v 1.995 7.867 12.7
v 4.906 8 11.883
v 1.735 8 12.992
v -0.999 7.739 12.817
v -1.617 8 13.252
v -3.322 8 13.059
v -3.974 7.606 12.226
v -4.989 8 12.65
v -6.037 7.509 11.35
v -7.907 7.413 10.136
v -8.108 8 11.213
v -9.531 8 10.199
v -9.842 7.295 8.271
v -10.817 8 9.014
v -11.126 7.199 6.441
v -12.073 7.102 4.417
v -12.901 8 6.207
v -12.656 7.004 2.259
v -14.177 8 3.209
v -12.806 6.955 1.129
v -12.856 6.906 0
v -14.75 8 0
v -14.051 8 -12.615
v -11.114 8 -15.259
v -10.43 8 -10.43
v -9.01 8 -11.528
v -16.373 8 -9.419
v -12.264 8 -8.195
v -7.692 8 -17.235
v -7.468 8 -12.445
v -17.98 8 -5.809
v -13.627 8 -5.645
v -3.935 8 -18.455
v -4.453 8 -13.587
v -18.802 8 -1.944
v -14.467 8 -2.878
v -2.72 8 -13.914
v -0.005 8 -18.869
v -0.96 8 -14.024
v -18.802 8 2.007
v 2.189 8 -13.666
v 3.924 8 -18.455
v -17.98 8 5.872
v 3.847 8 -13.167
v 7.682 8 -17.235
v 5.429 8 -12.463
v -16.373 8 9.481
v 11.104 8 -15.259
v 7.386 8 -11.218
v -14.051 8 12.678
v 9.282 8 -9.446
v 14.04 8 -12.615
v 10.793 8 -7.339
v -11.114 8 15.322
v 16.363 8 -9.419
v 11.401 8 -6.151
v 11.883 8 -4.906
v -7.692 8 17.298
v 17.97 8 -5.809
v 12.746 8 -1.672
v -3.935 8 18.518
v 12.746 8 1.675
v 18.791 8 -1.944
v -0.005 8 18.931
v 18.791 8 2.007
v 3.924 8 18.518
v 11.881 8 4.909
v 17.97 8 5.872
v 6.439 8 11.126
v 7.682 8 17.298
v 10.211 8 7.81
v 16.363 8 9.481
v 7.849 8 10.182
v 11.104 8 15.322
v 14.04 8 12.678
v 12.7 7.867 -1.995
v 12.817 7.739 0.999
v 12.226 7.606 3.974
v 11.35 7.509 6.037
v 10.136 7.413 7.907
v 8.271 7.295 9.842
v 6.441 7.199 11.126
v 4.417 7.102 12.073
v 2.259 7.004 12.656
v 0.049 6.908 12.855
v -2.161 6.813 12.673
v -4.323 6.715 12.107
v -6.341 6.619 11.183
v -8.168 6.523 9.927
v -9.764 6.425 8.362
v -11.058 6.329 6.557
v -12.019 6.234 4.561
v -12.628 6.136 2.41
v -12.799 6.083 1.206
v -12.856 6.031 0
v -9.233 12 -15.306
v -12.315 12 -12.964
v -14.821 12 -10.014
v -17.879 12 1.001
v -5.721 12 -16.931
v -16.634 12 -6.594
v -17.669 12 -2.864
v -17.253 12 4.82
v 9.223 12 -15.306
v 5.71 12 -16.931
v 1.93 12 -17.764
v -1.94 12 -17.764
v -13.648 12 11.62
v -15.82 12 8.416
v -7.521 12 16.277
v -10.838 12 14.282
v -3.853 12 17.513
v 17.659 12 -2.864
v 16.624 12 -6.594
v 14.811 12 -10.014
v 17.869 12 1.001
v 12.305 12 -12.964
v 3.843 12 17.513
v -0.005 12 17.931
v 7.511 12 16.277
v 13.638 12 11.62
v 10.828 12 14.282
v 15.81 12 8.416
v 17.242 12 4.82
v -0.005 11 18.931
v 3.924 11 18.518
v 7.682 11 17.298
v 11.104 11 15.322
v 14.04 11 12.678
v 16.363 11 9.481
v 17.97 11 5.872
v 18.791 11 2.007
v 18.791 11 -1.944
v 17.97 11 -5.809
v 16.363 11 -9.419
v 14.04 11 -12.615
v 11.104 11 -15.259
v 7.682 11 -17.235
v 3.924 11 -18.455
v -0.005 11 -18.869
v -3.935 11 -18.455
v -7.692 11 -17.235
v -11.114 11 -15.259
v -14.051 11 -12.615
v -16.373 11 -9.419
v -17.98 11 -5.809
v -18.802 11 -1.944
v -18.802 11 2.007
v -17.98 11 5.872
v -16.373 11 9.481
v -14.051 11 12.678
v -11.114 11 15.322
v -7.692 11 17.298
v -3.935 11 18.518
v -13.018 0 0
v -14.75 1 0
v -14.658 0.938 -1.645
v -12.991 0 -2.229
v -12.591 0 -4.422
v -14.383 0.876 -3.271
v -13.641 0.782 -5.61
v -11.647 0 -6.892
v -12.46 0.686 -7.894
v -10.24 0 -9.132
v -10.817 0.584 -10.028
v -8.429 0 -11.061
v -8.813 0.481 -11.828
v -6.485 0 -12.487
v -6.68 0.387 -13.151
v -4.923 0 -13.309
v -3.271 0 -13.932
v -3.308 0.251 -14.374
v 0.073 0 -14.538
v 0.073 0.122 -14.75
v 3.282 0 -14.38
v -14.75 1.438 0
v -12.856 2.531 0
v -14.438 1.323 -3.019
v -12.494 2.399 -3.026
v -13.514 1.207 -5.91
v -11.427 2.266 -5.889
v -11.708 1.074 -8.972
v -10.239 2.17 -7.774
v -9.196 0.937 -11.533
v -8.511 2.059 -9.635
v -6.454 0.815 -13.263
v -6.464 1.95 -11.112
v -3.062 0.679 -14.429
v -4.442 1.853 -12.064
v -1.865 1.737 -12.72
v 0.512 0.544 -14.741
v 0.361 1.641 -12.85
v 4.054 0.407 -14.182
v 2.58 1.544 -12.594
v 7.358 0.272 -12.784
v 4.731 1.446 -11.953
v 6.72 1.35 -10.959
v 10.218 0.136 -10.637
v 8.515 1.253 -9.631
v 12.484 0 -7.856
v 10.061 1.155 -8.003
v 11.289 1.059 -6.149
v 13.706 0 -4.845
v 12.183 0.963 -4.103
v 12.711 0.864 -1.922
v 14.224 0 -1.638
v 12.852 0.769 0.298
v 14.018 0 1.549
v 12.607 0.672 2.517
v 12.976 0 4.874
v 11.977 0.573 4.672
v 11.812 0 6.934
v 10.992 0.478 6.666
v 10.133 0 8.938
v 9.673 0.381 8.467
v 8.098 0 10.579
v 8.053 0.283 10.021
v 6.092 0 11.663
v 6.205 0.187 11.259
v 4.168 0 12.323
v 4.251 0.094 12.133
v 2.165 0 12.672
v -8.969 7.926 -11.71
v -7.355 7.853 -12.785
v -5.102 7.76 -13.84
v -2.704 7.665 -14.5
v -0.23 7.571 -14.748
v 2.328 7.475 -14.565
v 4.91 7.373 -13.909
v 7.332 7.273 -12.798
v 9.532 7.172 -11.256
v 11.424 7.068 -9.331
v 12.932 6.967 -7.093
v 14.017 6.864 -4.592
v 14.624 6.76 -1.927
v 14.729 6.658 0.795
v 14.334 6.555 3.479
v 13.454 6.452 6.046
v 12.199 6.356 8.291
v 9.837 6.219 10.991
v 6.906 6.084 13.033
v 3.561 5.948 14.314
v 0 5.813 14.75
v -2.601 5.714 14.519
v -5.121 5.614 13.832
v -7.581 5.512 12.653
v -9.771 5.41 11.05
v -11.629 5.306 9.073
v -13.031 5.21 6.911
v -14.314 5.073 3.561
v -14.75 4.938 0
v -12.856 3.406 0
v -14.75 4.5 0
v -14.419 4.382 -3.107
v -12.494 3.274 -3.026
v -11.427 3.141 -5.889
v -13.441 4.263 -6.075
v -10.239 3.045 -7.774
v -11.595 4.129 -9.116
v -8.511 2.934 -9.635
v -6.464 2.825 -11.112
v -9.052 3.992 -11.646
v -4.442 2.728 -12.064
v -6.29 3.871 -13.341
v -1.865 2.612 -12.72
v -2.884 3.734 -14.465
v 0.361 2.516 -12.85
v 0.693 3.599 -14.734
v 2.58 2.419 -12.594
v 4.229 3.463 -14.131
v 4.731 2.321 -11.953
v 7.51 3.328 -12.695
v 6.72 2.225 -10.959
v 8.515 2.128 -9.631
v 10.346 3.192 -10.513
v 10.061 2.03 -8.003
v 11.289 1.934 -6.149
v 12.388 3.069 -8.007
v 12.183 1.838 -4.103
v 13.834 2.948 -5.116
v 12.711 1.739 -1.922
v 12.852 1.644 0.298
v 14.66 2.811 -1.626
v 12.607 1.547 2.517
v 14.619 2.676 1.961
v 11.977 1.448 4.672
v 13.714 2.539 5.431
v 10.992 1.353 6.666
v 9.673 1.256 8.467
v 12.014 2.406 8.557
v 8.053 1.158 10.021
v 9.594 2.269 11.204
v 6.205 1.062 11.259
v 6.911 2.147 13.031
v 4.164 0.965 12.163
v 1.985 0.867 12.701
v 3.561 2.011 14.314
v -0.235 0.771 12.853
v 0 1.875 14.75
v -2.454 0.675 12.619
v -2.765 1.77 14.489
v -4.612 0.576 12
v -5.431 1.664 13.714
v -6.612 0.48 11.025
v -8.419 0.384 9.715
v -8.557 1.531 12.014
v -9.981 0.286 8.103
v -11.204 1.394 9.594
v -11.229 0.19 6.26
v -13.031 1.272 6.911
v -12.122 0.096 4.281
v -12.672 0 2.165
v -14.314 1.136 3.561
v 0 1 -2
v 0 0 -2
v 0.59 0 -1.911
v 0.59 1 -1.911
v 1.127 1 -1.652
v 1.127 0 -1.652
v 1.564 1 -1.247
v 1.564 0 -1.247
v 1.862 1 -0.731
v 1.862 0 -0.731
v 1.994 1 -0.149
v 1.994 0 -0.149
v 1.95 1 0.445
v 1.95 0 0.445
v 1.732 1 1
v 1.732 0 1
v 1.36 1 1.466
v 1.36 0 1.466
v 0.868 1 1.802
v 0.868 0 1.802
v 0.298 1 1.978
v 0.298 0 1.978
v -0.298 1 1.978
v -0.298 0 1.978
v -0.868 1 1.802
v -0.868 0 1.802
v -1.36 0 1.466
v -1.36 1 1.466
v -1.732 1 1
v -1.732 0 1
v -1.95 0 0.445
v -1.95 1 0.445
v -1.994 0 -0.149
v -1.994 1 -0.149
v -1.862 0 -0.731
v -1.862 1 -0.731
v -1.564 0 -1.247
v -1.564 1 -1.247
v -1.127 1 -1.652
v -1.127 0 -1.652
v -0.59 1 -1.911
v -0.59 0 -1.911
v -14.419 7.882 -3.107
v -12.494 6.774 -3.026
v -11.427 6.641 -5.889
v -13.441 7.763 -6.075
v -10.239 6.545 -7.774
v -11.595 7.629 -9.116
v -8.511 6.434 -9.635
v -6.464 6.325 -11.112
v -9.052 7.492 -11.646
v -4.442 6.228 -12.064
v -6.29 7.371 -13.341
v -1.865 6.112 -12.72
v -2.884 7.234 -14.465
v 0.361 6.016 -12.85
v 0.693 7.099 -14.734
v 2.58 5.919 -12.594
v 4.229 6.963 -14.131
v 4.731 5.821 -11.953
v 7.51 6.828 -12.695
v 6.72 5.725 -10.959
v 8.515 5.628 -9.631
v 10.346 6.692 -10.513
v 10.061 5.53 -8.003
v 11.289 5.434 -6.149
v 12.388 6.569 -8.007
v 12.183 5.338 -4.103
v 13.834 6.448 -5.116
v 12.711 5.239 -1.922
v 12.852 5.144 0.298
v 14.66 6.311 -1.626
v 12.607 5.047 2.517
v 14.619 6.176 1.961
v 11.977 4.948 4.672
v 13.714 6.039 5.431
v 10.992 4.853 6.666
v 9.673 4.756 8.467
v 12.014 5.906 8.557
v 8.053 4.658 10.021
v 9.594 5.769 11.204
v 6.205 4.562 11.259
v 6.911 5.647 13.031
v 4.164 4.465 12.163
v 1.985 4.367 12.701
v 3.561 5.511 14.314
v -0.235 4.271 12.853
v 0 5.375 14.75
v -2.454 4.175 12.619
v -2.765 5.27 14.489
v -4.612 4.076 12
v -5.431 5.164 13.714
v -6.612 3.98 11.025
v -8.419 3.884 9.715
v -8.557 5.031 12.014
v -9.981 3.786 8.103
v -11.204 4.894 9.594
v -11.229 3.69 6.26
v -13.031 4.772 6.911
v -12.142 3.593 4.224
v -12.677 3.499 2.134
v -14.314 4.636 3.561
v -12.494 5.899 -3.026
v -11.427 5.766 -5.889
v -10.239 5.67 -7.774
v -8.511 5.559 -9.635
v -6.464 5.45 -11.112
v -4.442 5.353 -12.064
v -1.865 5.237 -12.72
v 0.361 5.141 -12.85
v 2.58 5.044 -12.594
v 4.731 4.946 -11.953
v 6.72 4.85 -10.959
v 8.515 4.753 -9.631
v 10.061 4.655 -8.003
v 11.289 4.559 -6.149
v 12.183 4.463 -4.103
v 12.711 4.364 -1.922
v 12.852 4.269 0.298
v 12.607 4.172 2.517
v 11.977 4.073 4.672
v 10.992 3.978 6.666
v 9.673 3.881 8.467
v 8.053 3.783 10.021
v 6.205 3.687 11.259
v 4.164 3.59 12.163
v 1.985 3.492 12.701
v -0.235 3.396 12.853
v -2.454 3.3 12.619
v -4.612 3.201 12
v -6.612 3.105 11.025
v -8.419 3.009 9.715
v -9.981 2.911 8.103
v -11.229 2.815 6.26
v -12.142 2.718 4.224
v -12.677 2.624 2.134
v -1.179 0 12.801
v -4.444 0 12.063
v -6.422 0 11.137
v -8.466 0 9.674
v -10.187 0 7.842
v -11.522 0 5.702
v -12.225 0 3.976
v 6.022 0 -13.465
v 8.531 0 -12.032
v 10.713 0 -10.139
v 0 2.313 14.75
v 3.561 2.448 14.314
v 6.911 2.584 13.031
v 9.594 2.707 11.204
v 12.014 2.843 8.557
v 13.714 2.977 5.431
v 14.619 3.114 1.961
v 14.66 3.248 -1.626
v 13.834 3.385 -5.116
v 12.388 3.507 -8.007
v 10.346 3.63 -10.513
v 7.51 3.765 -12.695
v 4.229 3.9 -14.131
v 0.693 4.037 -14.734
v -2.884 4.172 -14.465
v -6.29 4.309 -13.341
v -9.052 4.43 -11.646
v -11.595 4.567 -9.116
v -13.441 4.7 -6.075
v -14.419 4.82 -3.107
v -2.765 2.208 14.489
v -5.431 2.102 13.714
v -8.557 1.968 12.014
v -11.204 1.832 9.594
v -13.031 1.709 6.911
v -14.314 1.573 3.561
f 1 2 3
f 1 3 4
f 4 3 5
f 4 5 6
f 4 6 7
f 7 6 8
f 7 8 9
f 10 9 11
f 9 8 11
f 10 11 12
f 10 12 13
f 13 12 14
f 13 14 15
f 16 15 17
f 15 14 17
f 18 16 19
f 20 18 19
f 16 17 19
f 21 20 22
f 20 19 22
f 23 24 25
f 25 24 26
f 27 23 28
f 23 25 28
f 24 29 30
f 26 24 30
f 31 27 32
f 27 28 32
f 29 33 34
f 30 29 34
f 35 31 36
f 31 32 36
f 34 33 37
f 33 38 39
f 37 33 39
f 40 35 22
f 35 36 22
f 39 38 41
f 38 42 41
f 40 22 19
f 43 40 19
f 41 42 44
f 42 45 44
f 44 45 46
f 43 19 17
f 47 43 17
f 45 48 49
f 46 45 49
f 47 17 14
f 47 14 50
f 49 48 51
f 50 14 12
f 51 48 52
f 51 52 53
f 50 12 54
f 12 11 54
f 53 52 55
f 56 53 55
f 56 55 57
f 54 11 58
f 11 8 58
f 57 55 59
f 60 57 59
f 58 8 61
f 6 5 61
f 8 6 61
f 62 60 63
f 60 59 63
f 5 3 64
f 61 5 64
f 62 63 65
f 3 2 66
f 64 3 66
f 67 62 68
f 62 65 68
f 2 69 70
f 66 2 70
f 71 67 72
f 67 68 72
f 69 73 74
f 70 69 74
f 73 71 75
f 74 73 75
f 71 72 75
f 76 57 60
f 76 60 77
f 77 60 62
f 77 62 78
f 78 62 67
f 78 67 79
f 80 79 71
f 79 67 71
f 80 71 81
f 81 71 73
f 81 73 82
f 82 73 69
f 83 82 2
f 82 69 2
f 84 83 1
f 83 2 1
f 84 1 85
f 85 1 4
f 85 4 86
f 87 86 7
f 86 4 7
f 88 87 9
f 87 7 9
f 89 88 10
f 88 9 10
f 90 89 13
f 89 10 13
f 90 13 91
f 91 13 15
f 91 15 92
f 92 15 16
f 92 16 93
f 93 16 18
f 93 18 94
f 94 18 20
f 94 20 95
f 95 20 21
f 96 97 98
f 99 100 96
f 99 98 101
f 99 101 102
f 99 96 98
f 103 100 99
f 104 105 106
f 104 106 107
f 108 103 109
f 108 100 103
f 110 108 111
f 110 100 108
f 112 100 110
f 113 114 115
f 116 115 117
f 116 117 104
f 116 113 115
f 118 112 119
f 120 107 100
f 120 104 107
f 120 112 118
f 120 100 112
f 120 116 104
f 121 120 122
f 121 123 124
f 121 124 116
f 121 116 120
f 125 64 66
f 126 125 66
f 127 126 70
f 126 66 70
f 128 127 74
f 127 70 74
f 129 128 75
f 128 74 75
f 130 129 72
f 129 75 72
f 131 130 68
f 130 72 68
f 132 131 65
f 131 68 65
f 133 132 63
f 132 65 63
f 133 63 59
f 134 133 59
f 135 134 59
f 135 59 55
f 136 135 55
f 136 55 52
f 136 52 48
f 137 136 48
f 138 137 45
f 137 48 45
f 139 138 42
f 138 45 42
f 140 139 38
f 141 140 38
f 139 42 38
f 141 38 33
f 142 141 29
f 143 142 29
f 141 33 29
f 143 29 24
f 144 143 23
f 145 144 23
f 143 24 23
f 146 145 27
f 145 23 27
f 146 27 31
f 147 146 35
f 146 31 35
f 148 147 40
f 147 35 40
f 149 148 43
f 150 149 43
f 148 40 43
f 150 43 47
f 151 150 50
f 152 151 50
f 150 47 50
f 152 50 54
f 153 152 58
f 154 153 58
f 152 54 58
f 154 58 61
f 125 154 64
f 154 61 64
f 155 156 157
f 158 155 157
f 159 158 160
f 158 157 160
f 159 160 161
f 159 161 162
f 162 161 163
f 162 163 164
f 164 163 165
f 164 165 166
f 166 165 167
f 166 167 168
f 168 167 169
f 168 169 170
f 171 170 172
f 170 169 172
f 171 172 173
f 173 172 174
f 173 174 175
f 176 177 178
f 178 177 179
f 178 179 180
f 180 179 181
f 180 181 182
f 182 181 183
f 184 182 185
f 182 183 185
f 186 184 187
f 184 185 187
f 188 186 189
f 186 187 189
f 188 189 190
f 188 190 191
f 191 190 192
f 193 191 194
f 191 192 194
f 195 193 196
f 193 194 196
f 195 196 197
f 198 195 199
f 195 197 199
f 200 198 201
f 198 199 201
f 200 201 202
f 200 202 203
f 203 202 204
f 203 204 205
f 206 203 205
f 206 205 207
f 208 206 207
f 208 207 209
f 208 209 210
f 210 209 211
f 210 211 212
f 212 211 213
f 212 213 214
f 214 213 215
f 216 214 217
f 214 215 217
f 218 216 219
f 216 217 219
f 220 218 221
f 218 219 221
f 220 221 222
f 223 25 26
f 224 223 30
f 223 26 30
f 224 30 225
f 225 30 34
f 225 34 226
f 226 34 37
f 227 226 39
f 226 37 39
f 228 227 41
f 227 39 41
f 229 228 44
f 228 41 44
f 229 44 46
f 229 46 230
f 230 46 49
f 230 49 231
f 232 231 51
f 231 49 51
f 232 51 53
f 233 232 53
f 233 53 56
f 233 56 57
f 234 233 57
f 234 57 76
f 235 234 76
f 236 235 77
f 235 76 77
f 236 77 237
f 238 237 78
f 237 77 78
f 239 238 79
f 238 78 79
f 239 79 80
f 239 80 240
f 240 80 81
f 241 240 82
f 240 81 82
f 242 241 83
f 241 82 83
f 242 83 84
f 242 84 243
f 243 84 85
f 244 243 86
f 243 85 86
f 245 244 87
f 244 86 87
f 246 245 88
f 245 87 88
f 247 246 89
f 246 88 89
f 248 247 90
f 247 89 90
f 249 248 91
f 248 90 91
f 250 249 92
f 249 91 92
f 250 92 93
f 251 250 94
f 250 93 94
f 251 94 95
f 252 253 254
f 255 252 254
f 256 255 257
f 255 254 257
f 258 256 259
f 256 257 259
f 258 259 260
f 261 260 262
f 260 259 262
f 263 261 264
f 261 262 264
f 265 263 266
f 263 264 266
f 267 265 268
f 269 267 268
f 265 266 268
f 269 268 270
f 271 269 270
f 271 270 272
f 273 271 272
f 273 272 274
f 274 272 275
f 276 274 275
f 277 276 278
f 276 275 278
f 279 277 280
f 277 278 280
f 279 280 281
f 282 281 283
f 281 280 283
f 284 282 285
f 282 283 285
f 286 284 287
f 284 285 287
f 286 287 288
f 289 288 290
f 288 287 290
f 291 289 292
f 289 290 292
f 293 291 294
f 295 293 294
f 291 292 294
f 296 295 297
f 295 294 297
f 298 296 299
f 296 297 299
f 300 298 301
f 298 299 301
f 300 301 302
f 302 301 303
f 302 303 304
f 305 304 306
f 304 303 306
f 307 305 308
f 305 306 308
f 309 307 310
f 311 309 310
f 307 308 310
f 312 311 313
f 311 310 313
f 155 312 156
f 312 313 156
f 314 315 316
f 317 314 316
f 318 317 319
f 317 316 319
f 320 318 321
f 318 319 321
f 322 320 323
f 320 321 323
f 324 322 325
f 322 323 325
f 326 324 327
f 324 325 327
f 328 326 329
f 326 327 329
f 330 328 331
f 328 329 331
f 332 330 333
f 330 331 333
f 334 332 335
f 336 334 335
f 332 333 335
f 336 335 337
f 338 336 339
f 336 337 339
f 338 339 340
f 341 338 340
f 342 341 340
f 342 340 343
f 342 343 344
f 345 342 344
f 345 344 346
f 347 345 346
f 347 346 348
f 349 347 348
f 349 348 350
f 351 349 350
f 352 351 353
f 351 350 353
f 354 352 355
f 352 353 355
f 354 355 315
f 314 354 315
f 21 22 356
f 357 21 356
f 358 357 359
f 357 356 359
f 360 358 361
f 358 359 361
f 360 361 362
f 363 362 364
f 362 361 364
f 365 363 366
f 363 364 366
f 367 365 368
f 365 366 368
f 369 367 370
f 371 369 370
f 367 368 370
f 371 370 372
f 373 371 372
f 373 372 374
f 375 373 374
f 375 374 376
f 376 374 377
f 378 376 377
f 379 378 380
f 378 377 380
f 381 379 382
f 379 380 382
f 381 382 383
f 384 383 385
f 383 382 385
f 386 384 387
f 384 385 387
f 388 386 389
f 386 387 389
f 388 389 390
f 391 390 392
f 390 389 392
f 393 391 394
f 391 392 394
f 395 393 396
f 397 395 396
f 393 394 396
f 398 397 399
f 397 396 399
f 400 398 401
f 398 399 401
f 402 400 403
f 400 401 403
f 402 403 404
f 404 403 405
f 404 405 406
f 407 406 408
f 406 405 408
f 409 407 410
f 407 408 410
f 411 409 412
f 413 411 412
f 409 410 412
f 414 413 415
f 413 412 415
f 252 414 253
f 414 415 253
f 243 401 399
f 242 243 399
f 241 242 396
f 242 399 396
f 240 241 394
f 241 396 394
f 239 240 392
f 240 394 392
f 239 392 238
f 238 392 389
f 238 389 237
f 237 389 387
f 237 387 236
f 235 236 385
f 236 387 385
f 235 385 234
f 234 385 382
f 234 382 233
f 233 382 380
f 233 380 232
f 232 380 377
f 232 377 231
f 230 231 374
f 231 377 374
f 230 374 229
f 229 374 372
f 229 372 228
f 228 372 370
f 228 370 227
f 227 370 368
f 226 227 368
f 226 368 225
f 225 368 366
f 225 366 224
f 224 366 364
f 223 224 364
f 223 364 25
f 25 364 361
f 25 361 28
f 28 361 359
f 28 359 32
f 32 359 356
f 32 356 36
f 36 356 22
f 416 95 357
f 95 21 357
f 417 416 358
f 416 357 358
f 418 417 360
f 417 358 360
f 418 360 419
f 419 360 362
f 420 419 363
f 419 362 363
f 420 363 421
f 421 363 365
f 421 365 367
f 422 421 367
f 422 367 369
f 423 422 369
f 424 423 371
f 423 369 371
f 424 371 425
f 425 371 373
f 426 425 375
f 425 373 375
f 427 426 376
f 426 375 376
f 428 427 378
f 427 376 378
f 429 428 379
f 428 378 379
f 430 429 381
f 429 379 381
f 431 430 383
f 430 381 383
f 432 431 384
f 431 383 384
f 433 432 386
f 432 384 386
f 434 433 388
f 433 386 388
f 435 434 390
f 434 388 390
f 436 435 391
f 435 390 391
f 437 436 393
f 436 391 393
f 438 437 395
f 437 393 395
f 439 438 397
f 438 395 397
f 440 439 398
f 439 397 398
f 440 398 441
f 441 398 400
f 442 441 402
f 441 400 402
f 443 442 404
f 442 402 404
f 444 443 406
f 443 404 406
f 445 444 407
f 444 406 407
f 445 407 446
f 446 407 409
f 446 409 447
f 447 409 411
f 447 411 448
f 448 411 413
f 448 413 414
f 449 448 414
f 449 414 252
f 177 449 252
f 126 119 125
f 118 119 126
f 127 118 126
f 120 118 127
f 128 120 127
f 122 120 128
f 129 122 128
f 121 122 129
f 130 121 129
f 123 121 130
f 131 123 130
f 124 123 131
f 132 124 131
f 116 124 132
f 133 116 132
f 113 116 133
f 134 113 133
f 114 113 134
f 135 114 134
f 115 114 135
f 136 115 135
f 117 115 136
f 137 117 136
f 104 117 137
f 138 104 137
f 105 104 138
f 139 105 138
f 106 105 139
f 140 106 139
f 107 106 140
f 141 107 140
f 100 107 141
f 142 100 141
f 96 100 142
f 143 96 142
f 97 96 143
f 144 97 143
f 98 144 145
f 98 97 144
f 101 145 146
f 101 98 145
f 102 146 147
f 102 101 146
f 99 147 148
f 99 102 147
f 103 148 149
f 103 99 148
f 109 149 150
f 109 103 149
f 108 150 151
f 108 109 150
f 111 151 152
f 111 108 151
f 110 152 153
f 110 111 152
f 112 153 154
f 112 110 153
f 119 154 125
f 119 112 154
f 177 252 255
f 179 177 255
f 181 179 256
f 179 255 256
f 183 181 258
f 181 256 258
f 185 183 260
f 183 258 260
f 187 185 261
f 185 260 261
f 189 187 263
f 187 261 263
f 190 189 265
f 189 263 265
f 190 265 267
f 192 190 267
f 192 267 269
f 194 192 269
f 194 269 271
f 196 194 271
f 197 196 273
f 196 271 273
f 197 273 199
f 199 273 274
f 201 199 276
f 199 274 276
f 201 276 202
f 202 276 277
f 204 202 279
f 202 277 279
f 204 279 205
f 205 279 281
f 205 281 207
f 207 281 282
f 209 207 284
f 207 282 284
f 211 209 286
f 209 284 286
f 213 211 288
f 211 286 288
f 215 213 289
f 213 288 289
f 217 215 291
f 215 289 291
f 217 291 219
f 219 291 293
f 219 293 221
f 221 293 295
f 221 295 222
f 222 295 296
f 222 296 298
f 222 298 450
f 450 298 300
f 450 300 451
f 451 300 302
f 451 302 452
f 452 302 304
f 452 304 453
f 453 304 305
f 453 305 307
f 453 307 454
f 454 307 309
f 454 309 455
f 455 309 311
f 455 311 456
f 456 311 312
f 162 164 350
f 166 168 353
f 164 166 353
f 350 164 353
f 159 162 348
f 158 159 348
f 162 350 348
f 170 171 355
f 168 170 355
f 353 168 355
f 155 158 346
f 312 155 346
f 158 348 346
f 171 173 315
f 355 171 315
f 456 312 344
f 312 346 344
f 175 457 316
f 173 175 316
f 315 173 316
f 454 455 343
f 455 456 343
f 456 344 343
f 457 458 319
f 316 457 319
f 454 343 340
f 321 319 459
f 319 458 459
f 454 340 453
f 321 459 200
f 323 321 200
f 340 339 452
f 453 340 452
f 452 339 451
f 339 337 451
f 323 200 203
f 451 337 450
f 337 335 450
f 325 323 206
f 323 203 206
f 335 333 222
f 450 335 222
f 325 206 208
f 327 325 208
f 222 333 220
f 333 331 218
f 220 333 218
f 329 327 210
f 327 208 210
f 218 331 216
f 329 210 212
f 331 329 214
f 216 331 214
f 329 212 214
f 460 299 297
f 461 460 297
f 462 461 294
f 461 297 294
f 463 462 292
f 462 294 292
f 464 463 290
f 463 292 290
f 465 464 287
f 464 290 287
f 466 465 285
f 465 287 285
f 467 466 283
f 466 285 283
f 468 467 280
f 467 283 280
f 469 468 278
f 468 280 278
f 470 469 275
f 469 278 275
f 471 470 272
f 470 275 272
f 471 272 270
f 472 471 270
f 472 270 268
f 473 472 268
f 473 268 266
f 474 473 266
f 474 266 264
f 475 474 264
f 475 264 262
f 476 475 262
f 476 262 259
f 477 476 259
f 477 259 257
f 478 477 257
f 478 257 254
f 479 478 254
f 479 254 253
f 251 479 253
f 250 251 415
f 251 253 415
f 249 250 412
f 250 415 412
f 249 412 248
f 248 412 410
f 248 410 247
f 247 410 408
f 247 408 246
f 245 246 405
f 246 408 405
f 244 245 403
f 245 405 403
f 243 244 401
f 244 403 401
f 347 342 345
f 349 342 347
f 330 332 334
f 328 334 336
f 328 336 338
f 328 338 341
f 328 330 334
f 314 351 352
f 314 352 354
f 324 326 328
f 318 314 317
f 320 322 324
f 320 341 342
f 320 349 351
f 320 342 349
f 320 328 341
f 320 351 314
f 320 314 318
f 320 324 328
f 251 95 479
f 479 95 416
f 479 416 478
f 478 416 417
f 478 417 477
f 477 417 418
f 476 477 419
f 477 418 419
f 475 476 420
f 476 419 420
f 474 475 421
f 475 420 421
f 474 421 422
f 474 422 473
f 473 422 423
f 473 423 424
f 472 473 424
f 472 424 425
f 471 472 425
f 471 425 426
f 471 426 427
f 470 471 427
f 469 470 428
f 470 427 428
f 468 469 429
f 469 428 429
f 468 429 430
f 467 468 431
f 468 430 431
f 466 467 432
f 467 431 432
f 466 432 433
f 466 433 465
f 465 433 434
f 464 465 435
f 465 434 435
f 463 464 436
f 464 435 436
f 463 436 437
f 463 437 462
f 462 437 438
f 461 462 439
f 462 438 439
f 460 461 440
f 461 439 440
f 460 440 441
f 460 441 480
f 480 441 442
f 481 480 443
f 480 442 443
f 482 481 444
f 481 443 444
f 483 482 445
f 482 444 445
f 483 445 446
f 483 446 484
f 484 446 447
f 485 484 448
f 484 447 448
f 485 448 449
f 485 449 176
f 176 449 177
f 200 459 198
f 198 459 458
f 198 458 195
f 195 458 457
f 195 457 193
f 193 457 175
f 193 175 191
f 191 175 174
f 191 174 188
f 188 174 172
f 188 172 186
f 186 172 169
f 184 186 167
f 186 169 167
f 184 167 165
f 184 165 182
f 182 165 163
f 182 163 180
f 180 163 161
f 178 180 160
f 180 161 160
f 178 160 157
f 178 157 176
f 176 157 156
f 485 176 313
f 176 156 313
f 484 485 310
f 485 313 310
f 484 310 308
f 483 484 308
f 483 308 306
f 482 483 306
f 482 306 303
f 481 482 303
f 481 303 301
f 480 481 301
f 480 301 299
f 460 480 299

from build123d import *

# Parameters (mm, degrees)
SKETCH1_R           = 14.75
BOSS_EXTRUDE1_DEPTH = 8
SKETCH2_R           = 18.9
BOSS_EXTRUDE2_DEPTH = 4
THREAD1_PITCH       = 3.5
THREAD1_FROM        = 3.5
CHAMFER2_SIZE       = 1
SKETCH3_R           = 2
CUT_EXTRUDE1_DEPTH  = 1


with BuildPart() as part:
    # Sketch1 → Boss-Extrude1 (new body)
    with BuildSketch(Plane(origin=(0, 0, 0), x_dir=(1, 0, 0), z_dir=(0, 1, 0))):
        with Locations(Location((0, 0, 0), (0, 0, 270))):
            Circle(SKETCH1_R)
    extrude(amount=BOSS_EXTRUDE1_DEPTH)

    # Sketch2 → Boss-Extrude2 (add)
    with BuildSketch(Plane(origin=(0, 8, 0), x_dir=(1, 0, 0), z_dir=(0, 1, 0))):
        with Locations(Location((-0.005064595, -0.031492848, 0), (0, 0, 270))):
            Circle(SKETCH2_R)
    extrude(amount=BOSS_EXTRUDE2_DEPTH)

    # Thread1: arcs per turn and ends read off the stored shape
    # Thread1: the profile of Thread Profile1 profile screwed along a right-hand helix through 3.285714 turns, 12 arcs to a turn; built about Z, then put on its axis
    thread1_z = Axis((0, 0, 0), (0, 0, 1))
    thread1_corners = [(14.7503, 0, -0.000173205), (14.7503, 0, 3.062673196), (12.855569438, 0, 1.968749995), (12.855569438, 0, 1.093749995)]
    with BuildLine(mode=Mode.PRIVATE) as thread1_profile:
        Line(thread1_corners[0], thread1_corners[1])
        Line(thread1_corners[1], thread1_corners[2])
        Line(thread1_corners[2], thread1_corners[3])
        Line(thread1_corners[3], thread1_corners[0])
    thread1_cap = Face(thread1_profile.wire())
    thread1_turn_angles = [0, 15, 30, 45, 60, 75, 90, 105, 120, 135, 150, 165, 180, 195, 210, 225, 240, 255, 270, 285, 300, 315, 330, 345, 360]
    thread1_turn_weights = [1, 0.9659258262890683, 1, 0.9659258262890683, 1, 0.9659258262890683, 1, 0.9659258262890683, 1, 0.9659258262890683, 1, 0.9659258262890683, 1, 0.9659258262890683, 1, 0.9659258262890683, 1, 0.9659258262890683, 1, 0.9659258262890683, 1, 0.9659258262890683, 1, 0.9659258262890683, 1]
    thread1_turn_rails = [Edge.make_bspline([Vector(p[0], p[1], 0).rotate(thread1_z, thread1_turn_angles[k]) / thread1_turn_weights[k] + Vector(0, 0, p[2] + THREAD1_PITCH * thread1_turn_angles[k] / 360) for k in range(25)], [0, 0, 0, 1, 1, 2, 2, 3, 3, 4, 4, 5, 5, 6, 6, 7, 7, 8, 8, 9, 9, 10, 10, 11, 11, 12, 12, 12], 2, thread1_turn_weights) for p in thread1_corners]
    thread1_turn_sides = [Face.make_surface_from_curves(thread1_turn_rails[p[0]], thread1_turn_rails[p[1]]) for p in [(0, 1), (1, 2), (2, 3), (3, 0)]]
    thread1_last_angles = [1080, 1095, 1110, 1125, 1140, 1155, 1170, 1176.428571429, 1182.857142857]
    thread1_last_weights = [1, 0.9659258262890683, 1, 0.9659258262890683, 1, 0.9659258262890683, 1, 0.9937122098932428, 1]
    thread1_last_rails = [Edge.make_bspline([Vector(p[0], p[1], 0).rotate(thread1_z, thread1_last_angles[k]) / thread1_last_weights[k] + Vector(0, 0, p[2] + THREAD1_PITCH * thread1_last_angles[k] / 360) for k in range(9)], [0, 0, 0, 1, 1, 2, 2, 3, 3, 4, 4, 4], 2, thread1_last_weights) for p in thread1_corners]
    thread1_last_sides = [Face.make_surface_from_curves(thread1_last_rails[p[0]], thread1_last_rails[p[1]]) for p in [(0, 1), (1, 2), (2, 3), (3, 0)]]
    thread1 = Plane(origin=(0, 11.5, 0), x_dir=(-1, 0, 0), z_dir=(0, -1, 0)) * split(Solid(Shell([*[p.moved(Location((0, 0, THREAD1_PITCH * i))) for i in range(3) for p in thread1_turn_sides], *thread1_last_sides, thread1_cap, thread1_cap.rotate(thread1_z, 1182.857142857).moved(Location((0, 0, THREAD1_PITCH * 1182.857142857 / 360)))])), bisect_by=Plane.XY.offset(THREAD1_FROM), keep=Keep.TOP, mode=Mode.PRIVATE)
    add(thread1, mode=Mode.SUBTRACT)

    # Chamfer2
    chamfer2_edges = [part.edges().sort_by_distance(p)[0] for p in [
        (-0.005064595, 12, -18.868507152),
    ]]
    chamfer(chamfer2_edges, length=CHAMFER2_SIZE)

    # Sketch3 → Cut-Extrude1 (cut)
    with BuildSketch(Plane.XZ):
        with Locations(Location((0, 0, 0), (0, 0, 270))):
            Circle(SKETCH3_R)
    extrude(amount=-CUT_EXTRUDE1_DEPTH, mode=Mode.SUBTRACT)


solid = part.part
